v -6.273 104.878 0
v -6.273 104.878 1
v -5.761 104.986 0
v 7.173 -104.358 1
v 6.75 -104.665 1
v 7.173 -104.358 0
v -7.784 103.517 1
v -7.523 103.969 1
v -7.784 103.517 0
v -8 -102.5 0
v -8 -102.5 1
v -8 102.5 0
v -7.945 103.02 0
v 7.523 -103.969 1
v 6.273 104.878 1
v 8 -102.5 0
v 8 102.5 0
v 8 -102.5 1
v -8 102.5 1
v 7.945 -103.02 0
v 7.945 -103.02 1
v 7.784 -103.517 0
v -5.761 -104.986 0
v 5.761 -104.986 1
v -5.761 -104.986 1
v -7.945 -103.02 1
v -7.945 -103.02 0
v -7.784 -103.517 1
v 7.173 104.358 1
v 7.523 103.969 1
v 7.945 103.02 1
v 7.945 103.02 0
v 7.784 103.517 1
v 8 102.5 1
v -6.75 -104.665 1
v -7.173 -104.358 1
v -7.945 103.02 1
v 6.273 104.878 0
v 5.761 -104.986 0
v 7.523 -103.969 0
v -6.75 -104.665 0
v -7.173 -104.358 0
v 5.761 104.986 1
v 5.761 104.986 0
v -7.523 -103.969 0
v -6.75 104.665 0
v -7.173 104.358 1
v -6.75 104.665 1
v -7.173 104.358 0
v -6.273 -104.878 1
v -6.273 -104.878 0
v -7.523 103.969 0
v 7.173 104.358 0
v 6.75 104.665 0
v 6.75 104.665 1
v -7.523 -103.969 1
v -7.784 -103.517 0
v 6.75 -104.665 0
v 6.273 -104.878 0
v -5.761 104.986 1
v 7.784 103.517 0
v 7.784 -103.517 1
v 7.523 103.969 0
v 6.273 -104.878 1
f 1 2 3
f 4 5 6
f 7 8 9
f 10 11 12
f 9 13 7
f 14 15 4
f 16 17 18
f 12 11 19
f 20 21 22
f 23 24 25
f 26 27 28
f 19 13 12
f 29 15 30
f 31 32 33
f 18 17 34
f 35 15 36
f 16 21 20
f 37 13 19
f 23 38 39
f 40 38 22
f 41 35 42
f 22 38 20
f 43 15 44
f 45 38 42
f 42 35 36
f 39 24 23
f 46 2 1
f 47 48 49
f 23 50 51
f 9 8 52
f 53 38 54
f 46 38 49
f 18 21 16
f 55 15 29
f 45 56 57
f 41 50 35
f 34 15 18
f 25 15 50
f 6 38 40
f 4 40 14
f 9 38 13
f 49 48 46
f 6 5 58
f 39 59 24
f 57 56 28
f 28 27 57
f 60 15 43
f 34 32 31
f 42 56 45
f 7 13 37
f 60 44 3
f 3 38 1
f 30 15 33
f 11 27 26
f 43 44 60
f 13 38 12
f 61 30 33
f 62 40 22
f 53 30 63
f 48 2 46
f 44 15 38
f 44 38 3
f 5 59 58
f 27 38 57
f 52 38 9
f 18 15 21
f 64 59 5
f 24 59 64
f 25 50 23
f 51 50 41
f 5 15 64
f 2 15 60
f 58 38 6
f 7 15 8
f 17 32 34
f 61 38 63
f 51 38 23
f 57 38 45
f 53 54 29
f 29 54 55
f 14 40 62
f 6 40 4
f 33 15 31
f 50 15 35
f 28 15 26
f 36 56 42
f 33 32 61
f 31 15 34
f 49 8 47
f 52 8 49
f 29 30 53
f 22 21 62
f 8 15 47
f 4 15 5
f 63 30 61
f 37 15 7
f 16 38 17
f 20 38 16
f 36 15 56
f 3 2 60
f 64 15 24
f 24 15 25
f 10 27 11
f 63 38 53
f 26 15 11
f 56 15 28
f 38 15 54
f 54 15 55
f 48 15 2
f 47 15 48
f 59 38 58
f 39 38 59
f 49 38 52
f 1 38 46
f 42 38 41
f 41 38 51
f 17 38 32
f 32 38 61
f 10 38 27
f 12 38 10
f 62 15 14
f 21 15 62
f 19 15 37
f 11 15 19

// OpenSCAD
WIDTH = 16;
LENGTH = 210;
THICKNESS = 1;
CORNER_DIA = 5;


$fn = 30;

module rounded_rect(width, length, height, corner_dia) {
    hull() {
        for(i = [-1, 1]) {
            for(j = [-1, 1]) {
                translate([i * (width - corner_dia)/2, j * (length - corner_dia)/2, 0])
                cylinder(d = corner_dia, h = height);
            }
        }
    }
}


rounded_rect(WIDTH, LENGTH, THICKNESS, CORNER_DIA);
